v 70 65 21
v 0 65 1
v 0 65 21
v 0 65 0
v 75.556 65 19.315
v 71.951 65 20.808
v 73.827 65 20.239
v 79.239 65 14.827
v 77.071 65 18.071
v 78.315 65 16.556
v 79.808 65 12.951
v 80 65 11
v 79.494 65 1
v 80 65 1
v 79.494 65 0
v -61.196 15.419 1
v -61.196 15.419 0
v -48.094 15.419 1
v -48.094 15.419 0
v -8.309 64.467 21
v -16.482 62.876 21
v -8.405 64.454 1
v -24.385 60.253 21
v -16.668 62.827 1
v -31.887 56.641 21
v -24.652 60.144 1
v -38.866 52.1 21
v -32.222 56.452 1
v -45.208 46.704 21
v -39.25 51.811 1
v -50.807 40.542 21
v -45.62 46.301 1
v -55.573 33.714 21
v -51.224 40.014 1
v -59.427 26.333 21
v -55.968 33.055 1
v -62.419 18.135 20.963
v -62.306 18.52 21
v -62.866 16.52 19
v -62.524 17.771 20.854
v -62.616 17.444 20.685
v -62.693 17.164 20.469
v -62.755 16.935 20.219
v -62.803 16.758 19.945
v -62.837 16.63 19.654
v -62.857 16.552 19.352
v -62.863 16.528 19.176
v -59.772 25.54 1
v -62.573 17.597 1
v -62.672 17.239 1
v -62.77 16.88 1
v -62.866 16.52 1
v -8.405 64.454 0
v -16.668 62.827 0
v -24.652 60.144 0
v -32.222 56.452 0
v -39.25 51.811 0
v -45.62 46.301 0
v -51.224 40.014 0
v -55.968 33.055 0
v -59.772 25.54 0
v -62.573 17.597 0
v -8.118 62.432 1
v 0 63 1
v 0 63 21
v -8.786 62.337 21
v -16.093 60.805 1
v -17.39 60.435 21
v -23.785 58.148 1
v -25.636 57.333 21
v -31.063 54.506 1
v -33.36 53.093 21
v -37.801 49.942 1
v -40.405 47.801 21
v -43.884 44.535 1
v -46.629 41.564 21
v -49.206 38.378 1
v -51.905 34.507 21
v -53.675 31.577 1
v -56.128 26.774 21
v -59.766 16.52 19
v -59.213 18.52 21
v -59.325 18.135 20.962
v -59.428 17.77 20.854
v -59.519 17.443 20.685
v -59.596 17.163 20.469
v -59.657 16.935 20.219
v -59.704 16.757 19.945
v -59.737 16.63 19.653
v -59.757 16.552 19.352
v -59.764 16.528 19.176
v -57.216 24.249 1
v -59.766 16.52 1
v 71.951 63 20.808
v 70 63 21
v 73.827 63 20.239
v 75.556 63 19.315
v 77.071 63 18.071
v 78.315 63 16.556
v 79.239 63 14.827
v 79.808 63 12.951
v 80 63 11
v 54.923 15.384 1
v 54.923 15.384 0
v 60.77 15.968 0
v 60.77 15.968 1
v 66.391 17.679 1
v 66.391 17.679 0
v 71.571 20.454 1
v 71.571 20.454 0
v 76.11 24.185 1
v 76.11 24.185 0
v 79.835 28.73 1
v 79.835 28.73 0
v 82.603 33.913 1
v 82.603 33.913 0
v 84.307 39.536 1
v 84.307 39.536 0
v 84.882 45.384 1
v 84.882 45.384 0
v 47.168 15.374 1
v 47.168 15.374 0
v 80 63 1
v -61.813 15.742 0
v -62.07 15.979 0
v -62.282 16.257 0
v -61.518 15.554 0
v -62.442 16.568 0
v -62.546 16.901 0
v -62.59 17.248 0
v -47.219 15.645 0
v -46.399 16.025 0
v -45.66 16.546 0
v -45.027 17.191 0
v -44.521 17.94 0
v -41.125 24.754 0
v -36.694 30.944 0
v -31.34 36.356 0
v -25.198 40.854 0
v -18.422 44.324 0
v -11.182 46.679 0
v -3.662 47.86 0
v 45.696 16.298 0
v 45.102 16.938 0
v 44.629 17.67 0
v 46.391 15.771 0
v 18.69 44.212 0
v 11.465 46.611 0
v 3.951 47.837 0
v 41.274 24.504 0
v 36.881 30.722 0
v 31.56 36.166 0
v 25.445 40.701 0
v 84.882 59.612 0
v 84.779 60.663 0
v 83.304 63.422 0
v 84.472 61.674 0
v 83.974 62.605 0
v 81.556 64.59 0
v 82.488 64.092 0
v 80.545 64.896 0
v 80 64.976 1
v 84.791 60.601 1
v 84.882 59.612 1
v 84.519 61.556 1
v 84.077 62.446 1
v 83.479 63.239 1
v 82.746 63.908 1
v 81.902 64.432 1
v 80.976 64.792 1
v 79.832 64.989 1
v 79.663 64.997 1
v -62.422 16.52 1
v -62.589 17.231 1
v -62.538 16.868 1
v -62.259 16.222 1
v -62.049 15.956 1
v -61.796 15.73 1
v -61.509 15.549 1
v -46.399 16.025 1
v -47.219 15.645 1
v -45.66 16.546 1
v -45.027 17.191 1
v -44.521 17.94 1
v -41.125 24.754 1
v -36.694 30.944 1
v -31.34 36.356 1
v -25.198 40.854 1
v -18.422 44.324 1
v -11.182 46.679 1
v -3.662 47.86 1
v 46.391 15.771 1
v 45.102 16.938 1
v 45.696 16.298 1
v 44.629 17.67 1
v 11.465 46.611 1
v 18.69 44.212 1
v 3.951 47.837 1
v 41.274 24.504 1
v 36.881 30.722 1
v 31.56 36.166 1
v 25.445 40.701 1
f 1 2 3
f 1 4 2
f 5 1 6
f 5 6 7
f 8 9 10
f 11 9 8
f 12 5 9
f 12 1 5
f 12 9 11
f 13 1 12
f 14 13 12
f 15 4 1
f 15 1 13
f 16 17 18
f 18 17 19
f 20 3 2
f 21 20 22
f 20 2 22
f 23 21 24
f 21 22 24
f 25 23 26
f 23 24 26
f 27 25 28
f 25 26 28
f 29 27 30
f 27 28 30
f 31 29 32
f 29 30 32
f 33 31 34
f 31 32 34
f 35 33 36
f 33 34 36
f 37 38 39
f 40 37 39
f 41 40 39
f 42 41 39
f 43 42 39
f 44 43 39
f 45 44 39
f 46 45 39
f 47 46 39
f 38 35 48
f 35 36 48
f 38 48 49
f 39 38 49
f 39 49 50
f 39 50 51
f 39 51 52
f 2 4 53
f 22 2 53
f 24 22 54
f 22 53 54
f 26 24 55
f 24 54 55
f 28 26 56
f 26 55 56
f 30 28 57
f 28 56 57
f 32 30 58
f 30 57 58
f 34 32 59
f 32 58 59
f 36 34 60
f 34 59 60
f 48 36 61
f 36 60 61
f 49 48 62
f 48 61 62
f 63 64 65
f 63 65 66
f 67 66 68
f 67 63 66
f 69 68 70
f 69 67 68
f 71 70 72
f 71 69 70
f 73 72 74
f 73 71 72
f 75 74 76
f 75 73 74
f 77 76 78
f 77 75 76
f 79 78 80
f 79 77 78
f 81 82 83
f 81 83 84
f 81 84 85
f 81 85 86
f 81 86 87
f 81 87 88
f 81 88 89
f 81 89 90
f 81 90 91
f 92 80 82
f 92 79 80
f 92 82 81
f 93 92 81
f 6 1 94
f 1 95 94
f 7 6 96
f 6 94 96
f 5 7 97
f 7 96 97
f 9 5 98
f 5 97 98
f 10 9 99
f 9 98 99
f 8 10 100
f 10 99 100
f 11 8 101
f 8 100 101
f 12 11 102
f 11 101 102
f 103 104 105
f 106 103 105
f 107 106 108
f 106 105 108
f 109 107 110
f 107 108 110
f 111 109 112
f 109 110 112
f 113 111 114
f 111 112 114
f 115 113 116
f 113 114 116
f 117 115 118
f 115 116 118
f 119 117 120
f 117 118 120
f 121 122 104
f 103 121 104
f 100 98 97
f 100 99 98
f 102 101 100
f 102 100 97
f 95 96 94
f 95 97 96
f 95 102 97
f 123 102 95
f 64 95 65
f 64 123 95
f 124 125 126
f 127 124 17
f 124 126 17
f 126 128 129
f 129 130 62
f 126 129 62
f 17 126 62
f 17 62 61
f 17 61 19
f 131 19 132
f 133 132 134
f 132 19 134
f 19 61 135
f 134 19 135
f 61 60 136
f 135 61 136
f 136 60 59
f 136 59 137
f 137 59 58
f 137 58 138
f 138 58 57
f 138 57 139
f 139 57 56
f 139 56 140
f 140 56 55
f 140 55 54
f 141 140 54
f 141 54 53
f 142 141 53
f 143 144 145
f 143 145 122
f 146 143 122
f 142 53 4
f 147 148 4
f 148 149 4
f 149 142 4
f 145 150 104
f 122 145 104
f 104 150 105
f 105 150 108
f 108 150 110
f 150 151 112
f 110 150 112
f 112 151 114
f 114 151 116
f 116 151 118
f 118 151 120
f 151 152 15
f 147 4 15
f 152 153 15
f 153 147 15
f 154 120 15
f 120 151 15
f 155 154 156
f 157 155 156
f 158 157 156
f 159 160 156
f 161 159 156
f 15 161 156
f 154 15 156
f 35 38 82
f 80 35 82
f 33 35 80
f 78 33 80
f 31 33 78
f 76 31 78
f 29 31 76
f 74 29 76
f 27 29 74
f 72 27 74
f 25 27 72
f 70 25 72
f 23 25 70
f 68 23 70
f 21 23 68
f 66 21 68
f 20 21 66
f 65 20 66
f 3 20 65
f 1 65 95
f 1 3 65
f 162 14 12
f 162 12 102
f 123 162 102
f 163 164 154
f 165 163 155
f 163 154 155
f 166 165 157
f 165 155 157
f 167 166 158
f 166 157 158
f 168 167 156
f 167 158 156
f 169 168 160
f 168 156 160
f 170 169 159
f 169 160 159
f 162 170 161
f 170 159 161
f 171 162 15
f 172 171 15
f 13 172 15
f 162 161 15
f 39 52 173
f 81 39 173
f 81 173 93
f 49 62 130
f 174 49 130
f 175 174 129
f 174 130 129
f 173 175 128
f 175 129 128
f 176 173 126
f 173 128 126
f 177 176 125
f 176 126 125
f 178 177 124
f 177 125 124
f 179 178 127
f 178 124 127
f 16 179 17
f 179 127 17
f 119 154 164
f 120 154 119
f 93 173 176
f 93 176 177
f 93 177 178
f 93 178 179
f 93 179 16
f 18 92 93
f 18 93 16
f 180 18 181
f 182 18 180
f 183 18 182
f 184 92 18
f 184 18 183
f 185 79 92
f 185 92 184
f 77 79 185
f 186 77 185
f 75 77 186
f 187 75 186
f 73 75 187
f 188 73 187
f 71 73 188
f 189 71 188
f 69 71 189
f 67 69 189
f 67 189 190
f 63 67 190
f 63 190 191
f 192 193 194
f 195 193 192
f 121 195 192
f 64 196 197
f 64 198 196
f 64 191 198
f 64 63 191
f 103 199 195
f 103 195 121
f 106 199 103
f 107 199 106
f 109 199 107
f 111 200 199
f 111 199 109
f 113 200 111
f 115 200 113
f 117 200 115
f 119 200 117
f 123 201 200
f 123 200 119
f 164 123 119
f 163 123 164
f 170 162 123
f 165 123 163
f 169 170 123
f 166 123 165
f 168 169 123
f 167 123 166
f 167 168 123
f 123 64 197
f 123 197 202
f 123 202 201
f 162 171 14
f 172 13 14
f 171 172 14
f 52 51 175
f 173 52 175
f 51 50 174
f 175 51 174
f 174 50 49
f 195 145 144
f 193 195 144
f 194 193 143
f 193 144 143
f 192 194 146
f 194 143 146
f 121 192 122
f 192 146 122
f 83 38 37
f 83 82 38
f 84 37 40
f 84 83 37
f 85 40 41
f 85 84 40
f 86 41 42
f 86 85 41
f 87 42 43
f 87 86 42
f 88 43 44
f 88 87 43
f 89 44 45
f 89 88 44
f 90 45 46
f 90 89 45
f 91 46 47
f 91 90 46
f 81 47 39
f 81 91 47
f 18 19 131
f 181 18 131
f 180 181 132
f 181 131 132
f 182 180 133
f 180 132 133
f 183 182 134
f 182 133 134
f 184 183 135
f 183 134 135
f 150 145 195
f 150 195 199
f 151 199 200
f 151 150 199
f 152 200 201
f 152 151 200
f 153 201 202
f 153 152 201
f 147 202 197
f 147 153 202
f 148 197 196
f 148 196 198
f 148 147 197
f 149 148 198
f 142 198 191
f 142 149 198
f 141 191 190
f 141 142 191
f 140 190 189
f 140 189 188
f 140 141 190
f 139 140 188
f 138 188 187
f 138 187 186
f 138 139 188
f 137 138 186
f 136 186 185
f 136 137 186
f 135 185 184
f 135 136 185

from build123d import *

# Parameters (mm, degrees)
PAD_DEPTH    = 1
PAD004_DEPTH = 20
FILLET_R     = 10
FILLET001_R  = 2


with BuildPart() as part:
    # Sketch → Pad (new body)
    with BuildSketch(Plane.XY):
        with BuildLine():
            ThreePointArc((0, 65), (-39.250322, 51.811314), (-62.572638, 17.5973))
            ThreePointArc((-62.572638, 17.5973), (-62.281657, 16.256919), (-61.1956, 15.4192))
            Line((-61.1956, 15.4192), (-48.0942, 15.4192))
            ThreePointArc((-48.0942, 15.4192), (-46.017568, 16.268418), (-44.521334, 17.9402))
            ThreePointArc((44.629065, 17.6705), (0.14521, 47.99978), (-44.521334, 17.9402))
            ThreePointArc((44.629065, 17.6705), (45.695788, 16.297968), (47.167959, 15.3736))
            Line((47.167959, 15.3736), (54.923211, 15.384158))
            ThreePointArc((54.923211, 15.384158), (76.110008, 24.185371), (84.88237, 45.38413))
            Line((84.88237, 59.61183), (84.88237, 45.38413))
            ThreePointArc((84.88237, 59.61183), (83.304212, 63.421842), (79.4942, 65))
            Line((0, 65), (79.4942, 65))
        make_face()
    extrude(amount=PAD_DEPTH)

    # Sketch001 → Pad004 (new body)
    with BuildSketch(Plane.XY.offset(1)):
        with BuildLine():
            ThreePointArc((6e-05, 65), (-39.693641, 51.472467), (-62.865542, 16.5204))
            Line((-62.865542, 16.5204), (-59.765542, 16.5204))
            ThreePointArc((6e-05, 63), (-37.80132, 49.942273), (-59.765542, 16.5204))
            Line((80.00006, 63), (6e-05, 63))
            Line((80.00006, 65), (80.00006, 63))
            Line((6e-05, 65), (80.00006, 65))
        make_face()
    extrude(amount=PAD004_DEPTH)

    # Fillet
    fillet_edges = [part.edges().sort_by_distance(p)[0] for p in [
        (80.00006, 64, 21),
    ]]
    fillet(fillet_edges, radius=FILLET_R)

    # Fillet001
    fillet001_edges = [part.edges().sort_by_distance(p)[0] for p in [
        (-61.315542, 16.5204, 21),
    ]]
    fillet(fillet001_edges, radius=FILLET001_R)


solid = part.part
